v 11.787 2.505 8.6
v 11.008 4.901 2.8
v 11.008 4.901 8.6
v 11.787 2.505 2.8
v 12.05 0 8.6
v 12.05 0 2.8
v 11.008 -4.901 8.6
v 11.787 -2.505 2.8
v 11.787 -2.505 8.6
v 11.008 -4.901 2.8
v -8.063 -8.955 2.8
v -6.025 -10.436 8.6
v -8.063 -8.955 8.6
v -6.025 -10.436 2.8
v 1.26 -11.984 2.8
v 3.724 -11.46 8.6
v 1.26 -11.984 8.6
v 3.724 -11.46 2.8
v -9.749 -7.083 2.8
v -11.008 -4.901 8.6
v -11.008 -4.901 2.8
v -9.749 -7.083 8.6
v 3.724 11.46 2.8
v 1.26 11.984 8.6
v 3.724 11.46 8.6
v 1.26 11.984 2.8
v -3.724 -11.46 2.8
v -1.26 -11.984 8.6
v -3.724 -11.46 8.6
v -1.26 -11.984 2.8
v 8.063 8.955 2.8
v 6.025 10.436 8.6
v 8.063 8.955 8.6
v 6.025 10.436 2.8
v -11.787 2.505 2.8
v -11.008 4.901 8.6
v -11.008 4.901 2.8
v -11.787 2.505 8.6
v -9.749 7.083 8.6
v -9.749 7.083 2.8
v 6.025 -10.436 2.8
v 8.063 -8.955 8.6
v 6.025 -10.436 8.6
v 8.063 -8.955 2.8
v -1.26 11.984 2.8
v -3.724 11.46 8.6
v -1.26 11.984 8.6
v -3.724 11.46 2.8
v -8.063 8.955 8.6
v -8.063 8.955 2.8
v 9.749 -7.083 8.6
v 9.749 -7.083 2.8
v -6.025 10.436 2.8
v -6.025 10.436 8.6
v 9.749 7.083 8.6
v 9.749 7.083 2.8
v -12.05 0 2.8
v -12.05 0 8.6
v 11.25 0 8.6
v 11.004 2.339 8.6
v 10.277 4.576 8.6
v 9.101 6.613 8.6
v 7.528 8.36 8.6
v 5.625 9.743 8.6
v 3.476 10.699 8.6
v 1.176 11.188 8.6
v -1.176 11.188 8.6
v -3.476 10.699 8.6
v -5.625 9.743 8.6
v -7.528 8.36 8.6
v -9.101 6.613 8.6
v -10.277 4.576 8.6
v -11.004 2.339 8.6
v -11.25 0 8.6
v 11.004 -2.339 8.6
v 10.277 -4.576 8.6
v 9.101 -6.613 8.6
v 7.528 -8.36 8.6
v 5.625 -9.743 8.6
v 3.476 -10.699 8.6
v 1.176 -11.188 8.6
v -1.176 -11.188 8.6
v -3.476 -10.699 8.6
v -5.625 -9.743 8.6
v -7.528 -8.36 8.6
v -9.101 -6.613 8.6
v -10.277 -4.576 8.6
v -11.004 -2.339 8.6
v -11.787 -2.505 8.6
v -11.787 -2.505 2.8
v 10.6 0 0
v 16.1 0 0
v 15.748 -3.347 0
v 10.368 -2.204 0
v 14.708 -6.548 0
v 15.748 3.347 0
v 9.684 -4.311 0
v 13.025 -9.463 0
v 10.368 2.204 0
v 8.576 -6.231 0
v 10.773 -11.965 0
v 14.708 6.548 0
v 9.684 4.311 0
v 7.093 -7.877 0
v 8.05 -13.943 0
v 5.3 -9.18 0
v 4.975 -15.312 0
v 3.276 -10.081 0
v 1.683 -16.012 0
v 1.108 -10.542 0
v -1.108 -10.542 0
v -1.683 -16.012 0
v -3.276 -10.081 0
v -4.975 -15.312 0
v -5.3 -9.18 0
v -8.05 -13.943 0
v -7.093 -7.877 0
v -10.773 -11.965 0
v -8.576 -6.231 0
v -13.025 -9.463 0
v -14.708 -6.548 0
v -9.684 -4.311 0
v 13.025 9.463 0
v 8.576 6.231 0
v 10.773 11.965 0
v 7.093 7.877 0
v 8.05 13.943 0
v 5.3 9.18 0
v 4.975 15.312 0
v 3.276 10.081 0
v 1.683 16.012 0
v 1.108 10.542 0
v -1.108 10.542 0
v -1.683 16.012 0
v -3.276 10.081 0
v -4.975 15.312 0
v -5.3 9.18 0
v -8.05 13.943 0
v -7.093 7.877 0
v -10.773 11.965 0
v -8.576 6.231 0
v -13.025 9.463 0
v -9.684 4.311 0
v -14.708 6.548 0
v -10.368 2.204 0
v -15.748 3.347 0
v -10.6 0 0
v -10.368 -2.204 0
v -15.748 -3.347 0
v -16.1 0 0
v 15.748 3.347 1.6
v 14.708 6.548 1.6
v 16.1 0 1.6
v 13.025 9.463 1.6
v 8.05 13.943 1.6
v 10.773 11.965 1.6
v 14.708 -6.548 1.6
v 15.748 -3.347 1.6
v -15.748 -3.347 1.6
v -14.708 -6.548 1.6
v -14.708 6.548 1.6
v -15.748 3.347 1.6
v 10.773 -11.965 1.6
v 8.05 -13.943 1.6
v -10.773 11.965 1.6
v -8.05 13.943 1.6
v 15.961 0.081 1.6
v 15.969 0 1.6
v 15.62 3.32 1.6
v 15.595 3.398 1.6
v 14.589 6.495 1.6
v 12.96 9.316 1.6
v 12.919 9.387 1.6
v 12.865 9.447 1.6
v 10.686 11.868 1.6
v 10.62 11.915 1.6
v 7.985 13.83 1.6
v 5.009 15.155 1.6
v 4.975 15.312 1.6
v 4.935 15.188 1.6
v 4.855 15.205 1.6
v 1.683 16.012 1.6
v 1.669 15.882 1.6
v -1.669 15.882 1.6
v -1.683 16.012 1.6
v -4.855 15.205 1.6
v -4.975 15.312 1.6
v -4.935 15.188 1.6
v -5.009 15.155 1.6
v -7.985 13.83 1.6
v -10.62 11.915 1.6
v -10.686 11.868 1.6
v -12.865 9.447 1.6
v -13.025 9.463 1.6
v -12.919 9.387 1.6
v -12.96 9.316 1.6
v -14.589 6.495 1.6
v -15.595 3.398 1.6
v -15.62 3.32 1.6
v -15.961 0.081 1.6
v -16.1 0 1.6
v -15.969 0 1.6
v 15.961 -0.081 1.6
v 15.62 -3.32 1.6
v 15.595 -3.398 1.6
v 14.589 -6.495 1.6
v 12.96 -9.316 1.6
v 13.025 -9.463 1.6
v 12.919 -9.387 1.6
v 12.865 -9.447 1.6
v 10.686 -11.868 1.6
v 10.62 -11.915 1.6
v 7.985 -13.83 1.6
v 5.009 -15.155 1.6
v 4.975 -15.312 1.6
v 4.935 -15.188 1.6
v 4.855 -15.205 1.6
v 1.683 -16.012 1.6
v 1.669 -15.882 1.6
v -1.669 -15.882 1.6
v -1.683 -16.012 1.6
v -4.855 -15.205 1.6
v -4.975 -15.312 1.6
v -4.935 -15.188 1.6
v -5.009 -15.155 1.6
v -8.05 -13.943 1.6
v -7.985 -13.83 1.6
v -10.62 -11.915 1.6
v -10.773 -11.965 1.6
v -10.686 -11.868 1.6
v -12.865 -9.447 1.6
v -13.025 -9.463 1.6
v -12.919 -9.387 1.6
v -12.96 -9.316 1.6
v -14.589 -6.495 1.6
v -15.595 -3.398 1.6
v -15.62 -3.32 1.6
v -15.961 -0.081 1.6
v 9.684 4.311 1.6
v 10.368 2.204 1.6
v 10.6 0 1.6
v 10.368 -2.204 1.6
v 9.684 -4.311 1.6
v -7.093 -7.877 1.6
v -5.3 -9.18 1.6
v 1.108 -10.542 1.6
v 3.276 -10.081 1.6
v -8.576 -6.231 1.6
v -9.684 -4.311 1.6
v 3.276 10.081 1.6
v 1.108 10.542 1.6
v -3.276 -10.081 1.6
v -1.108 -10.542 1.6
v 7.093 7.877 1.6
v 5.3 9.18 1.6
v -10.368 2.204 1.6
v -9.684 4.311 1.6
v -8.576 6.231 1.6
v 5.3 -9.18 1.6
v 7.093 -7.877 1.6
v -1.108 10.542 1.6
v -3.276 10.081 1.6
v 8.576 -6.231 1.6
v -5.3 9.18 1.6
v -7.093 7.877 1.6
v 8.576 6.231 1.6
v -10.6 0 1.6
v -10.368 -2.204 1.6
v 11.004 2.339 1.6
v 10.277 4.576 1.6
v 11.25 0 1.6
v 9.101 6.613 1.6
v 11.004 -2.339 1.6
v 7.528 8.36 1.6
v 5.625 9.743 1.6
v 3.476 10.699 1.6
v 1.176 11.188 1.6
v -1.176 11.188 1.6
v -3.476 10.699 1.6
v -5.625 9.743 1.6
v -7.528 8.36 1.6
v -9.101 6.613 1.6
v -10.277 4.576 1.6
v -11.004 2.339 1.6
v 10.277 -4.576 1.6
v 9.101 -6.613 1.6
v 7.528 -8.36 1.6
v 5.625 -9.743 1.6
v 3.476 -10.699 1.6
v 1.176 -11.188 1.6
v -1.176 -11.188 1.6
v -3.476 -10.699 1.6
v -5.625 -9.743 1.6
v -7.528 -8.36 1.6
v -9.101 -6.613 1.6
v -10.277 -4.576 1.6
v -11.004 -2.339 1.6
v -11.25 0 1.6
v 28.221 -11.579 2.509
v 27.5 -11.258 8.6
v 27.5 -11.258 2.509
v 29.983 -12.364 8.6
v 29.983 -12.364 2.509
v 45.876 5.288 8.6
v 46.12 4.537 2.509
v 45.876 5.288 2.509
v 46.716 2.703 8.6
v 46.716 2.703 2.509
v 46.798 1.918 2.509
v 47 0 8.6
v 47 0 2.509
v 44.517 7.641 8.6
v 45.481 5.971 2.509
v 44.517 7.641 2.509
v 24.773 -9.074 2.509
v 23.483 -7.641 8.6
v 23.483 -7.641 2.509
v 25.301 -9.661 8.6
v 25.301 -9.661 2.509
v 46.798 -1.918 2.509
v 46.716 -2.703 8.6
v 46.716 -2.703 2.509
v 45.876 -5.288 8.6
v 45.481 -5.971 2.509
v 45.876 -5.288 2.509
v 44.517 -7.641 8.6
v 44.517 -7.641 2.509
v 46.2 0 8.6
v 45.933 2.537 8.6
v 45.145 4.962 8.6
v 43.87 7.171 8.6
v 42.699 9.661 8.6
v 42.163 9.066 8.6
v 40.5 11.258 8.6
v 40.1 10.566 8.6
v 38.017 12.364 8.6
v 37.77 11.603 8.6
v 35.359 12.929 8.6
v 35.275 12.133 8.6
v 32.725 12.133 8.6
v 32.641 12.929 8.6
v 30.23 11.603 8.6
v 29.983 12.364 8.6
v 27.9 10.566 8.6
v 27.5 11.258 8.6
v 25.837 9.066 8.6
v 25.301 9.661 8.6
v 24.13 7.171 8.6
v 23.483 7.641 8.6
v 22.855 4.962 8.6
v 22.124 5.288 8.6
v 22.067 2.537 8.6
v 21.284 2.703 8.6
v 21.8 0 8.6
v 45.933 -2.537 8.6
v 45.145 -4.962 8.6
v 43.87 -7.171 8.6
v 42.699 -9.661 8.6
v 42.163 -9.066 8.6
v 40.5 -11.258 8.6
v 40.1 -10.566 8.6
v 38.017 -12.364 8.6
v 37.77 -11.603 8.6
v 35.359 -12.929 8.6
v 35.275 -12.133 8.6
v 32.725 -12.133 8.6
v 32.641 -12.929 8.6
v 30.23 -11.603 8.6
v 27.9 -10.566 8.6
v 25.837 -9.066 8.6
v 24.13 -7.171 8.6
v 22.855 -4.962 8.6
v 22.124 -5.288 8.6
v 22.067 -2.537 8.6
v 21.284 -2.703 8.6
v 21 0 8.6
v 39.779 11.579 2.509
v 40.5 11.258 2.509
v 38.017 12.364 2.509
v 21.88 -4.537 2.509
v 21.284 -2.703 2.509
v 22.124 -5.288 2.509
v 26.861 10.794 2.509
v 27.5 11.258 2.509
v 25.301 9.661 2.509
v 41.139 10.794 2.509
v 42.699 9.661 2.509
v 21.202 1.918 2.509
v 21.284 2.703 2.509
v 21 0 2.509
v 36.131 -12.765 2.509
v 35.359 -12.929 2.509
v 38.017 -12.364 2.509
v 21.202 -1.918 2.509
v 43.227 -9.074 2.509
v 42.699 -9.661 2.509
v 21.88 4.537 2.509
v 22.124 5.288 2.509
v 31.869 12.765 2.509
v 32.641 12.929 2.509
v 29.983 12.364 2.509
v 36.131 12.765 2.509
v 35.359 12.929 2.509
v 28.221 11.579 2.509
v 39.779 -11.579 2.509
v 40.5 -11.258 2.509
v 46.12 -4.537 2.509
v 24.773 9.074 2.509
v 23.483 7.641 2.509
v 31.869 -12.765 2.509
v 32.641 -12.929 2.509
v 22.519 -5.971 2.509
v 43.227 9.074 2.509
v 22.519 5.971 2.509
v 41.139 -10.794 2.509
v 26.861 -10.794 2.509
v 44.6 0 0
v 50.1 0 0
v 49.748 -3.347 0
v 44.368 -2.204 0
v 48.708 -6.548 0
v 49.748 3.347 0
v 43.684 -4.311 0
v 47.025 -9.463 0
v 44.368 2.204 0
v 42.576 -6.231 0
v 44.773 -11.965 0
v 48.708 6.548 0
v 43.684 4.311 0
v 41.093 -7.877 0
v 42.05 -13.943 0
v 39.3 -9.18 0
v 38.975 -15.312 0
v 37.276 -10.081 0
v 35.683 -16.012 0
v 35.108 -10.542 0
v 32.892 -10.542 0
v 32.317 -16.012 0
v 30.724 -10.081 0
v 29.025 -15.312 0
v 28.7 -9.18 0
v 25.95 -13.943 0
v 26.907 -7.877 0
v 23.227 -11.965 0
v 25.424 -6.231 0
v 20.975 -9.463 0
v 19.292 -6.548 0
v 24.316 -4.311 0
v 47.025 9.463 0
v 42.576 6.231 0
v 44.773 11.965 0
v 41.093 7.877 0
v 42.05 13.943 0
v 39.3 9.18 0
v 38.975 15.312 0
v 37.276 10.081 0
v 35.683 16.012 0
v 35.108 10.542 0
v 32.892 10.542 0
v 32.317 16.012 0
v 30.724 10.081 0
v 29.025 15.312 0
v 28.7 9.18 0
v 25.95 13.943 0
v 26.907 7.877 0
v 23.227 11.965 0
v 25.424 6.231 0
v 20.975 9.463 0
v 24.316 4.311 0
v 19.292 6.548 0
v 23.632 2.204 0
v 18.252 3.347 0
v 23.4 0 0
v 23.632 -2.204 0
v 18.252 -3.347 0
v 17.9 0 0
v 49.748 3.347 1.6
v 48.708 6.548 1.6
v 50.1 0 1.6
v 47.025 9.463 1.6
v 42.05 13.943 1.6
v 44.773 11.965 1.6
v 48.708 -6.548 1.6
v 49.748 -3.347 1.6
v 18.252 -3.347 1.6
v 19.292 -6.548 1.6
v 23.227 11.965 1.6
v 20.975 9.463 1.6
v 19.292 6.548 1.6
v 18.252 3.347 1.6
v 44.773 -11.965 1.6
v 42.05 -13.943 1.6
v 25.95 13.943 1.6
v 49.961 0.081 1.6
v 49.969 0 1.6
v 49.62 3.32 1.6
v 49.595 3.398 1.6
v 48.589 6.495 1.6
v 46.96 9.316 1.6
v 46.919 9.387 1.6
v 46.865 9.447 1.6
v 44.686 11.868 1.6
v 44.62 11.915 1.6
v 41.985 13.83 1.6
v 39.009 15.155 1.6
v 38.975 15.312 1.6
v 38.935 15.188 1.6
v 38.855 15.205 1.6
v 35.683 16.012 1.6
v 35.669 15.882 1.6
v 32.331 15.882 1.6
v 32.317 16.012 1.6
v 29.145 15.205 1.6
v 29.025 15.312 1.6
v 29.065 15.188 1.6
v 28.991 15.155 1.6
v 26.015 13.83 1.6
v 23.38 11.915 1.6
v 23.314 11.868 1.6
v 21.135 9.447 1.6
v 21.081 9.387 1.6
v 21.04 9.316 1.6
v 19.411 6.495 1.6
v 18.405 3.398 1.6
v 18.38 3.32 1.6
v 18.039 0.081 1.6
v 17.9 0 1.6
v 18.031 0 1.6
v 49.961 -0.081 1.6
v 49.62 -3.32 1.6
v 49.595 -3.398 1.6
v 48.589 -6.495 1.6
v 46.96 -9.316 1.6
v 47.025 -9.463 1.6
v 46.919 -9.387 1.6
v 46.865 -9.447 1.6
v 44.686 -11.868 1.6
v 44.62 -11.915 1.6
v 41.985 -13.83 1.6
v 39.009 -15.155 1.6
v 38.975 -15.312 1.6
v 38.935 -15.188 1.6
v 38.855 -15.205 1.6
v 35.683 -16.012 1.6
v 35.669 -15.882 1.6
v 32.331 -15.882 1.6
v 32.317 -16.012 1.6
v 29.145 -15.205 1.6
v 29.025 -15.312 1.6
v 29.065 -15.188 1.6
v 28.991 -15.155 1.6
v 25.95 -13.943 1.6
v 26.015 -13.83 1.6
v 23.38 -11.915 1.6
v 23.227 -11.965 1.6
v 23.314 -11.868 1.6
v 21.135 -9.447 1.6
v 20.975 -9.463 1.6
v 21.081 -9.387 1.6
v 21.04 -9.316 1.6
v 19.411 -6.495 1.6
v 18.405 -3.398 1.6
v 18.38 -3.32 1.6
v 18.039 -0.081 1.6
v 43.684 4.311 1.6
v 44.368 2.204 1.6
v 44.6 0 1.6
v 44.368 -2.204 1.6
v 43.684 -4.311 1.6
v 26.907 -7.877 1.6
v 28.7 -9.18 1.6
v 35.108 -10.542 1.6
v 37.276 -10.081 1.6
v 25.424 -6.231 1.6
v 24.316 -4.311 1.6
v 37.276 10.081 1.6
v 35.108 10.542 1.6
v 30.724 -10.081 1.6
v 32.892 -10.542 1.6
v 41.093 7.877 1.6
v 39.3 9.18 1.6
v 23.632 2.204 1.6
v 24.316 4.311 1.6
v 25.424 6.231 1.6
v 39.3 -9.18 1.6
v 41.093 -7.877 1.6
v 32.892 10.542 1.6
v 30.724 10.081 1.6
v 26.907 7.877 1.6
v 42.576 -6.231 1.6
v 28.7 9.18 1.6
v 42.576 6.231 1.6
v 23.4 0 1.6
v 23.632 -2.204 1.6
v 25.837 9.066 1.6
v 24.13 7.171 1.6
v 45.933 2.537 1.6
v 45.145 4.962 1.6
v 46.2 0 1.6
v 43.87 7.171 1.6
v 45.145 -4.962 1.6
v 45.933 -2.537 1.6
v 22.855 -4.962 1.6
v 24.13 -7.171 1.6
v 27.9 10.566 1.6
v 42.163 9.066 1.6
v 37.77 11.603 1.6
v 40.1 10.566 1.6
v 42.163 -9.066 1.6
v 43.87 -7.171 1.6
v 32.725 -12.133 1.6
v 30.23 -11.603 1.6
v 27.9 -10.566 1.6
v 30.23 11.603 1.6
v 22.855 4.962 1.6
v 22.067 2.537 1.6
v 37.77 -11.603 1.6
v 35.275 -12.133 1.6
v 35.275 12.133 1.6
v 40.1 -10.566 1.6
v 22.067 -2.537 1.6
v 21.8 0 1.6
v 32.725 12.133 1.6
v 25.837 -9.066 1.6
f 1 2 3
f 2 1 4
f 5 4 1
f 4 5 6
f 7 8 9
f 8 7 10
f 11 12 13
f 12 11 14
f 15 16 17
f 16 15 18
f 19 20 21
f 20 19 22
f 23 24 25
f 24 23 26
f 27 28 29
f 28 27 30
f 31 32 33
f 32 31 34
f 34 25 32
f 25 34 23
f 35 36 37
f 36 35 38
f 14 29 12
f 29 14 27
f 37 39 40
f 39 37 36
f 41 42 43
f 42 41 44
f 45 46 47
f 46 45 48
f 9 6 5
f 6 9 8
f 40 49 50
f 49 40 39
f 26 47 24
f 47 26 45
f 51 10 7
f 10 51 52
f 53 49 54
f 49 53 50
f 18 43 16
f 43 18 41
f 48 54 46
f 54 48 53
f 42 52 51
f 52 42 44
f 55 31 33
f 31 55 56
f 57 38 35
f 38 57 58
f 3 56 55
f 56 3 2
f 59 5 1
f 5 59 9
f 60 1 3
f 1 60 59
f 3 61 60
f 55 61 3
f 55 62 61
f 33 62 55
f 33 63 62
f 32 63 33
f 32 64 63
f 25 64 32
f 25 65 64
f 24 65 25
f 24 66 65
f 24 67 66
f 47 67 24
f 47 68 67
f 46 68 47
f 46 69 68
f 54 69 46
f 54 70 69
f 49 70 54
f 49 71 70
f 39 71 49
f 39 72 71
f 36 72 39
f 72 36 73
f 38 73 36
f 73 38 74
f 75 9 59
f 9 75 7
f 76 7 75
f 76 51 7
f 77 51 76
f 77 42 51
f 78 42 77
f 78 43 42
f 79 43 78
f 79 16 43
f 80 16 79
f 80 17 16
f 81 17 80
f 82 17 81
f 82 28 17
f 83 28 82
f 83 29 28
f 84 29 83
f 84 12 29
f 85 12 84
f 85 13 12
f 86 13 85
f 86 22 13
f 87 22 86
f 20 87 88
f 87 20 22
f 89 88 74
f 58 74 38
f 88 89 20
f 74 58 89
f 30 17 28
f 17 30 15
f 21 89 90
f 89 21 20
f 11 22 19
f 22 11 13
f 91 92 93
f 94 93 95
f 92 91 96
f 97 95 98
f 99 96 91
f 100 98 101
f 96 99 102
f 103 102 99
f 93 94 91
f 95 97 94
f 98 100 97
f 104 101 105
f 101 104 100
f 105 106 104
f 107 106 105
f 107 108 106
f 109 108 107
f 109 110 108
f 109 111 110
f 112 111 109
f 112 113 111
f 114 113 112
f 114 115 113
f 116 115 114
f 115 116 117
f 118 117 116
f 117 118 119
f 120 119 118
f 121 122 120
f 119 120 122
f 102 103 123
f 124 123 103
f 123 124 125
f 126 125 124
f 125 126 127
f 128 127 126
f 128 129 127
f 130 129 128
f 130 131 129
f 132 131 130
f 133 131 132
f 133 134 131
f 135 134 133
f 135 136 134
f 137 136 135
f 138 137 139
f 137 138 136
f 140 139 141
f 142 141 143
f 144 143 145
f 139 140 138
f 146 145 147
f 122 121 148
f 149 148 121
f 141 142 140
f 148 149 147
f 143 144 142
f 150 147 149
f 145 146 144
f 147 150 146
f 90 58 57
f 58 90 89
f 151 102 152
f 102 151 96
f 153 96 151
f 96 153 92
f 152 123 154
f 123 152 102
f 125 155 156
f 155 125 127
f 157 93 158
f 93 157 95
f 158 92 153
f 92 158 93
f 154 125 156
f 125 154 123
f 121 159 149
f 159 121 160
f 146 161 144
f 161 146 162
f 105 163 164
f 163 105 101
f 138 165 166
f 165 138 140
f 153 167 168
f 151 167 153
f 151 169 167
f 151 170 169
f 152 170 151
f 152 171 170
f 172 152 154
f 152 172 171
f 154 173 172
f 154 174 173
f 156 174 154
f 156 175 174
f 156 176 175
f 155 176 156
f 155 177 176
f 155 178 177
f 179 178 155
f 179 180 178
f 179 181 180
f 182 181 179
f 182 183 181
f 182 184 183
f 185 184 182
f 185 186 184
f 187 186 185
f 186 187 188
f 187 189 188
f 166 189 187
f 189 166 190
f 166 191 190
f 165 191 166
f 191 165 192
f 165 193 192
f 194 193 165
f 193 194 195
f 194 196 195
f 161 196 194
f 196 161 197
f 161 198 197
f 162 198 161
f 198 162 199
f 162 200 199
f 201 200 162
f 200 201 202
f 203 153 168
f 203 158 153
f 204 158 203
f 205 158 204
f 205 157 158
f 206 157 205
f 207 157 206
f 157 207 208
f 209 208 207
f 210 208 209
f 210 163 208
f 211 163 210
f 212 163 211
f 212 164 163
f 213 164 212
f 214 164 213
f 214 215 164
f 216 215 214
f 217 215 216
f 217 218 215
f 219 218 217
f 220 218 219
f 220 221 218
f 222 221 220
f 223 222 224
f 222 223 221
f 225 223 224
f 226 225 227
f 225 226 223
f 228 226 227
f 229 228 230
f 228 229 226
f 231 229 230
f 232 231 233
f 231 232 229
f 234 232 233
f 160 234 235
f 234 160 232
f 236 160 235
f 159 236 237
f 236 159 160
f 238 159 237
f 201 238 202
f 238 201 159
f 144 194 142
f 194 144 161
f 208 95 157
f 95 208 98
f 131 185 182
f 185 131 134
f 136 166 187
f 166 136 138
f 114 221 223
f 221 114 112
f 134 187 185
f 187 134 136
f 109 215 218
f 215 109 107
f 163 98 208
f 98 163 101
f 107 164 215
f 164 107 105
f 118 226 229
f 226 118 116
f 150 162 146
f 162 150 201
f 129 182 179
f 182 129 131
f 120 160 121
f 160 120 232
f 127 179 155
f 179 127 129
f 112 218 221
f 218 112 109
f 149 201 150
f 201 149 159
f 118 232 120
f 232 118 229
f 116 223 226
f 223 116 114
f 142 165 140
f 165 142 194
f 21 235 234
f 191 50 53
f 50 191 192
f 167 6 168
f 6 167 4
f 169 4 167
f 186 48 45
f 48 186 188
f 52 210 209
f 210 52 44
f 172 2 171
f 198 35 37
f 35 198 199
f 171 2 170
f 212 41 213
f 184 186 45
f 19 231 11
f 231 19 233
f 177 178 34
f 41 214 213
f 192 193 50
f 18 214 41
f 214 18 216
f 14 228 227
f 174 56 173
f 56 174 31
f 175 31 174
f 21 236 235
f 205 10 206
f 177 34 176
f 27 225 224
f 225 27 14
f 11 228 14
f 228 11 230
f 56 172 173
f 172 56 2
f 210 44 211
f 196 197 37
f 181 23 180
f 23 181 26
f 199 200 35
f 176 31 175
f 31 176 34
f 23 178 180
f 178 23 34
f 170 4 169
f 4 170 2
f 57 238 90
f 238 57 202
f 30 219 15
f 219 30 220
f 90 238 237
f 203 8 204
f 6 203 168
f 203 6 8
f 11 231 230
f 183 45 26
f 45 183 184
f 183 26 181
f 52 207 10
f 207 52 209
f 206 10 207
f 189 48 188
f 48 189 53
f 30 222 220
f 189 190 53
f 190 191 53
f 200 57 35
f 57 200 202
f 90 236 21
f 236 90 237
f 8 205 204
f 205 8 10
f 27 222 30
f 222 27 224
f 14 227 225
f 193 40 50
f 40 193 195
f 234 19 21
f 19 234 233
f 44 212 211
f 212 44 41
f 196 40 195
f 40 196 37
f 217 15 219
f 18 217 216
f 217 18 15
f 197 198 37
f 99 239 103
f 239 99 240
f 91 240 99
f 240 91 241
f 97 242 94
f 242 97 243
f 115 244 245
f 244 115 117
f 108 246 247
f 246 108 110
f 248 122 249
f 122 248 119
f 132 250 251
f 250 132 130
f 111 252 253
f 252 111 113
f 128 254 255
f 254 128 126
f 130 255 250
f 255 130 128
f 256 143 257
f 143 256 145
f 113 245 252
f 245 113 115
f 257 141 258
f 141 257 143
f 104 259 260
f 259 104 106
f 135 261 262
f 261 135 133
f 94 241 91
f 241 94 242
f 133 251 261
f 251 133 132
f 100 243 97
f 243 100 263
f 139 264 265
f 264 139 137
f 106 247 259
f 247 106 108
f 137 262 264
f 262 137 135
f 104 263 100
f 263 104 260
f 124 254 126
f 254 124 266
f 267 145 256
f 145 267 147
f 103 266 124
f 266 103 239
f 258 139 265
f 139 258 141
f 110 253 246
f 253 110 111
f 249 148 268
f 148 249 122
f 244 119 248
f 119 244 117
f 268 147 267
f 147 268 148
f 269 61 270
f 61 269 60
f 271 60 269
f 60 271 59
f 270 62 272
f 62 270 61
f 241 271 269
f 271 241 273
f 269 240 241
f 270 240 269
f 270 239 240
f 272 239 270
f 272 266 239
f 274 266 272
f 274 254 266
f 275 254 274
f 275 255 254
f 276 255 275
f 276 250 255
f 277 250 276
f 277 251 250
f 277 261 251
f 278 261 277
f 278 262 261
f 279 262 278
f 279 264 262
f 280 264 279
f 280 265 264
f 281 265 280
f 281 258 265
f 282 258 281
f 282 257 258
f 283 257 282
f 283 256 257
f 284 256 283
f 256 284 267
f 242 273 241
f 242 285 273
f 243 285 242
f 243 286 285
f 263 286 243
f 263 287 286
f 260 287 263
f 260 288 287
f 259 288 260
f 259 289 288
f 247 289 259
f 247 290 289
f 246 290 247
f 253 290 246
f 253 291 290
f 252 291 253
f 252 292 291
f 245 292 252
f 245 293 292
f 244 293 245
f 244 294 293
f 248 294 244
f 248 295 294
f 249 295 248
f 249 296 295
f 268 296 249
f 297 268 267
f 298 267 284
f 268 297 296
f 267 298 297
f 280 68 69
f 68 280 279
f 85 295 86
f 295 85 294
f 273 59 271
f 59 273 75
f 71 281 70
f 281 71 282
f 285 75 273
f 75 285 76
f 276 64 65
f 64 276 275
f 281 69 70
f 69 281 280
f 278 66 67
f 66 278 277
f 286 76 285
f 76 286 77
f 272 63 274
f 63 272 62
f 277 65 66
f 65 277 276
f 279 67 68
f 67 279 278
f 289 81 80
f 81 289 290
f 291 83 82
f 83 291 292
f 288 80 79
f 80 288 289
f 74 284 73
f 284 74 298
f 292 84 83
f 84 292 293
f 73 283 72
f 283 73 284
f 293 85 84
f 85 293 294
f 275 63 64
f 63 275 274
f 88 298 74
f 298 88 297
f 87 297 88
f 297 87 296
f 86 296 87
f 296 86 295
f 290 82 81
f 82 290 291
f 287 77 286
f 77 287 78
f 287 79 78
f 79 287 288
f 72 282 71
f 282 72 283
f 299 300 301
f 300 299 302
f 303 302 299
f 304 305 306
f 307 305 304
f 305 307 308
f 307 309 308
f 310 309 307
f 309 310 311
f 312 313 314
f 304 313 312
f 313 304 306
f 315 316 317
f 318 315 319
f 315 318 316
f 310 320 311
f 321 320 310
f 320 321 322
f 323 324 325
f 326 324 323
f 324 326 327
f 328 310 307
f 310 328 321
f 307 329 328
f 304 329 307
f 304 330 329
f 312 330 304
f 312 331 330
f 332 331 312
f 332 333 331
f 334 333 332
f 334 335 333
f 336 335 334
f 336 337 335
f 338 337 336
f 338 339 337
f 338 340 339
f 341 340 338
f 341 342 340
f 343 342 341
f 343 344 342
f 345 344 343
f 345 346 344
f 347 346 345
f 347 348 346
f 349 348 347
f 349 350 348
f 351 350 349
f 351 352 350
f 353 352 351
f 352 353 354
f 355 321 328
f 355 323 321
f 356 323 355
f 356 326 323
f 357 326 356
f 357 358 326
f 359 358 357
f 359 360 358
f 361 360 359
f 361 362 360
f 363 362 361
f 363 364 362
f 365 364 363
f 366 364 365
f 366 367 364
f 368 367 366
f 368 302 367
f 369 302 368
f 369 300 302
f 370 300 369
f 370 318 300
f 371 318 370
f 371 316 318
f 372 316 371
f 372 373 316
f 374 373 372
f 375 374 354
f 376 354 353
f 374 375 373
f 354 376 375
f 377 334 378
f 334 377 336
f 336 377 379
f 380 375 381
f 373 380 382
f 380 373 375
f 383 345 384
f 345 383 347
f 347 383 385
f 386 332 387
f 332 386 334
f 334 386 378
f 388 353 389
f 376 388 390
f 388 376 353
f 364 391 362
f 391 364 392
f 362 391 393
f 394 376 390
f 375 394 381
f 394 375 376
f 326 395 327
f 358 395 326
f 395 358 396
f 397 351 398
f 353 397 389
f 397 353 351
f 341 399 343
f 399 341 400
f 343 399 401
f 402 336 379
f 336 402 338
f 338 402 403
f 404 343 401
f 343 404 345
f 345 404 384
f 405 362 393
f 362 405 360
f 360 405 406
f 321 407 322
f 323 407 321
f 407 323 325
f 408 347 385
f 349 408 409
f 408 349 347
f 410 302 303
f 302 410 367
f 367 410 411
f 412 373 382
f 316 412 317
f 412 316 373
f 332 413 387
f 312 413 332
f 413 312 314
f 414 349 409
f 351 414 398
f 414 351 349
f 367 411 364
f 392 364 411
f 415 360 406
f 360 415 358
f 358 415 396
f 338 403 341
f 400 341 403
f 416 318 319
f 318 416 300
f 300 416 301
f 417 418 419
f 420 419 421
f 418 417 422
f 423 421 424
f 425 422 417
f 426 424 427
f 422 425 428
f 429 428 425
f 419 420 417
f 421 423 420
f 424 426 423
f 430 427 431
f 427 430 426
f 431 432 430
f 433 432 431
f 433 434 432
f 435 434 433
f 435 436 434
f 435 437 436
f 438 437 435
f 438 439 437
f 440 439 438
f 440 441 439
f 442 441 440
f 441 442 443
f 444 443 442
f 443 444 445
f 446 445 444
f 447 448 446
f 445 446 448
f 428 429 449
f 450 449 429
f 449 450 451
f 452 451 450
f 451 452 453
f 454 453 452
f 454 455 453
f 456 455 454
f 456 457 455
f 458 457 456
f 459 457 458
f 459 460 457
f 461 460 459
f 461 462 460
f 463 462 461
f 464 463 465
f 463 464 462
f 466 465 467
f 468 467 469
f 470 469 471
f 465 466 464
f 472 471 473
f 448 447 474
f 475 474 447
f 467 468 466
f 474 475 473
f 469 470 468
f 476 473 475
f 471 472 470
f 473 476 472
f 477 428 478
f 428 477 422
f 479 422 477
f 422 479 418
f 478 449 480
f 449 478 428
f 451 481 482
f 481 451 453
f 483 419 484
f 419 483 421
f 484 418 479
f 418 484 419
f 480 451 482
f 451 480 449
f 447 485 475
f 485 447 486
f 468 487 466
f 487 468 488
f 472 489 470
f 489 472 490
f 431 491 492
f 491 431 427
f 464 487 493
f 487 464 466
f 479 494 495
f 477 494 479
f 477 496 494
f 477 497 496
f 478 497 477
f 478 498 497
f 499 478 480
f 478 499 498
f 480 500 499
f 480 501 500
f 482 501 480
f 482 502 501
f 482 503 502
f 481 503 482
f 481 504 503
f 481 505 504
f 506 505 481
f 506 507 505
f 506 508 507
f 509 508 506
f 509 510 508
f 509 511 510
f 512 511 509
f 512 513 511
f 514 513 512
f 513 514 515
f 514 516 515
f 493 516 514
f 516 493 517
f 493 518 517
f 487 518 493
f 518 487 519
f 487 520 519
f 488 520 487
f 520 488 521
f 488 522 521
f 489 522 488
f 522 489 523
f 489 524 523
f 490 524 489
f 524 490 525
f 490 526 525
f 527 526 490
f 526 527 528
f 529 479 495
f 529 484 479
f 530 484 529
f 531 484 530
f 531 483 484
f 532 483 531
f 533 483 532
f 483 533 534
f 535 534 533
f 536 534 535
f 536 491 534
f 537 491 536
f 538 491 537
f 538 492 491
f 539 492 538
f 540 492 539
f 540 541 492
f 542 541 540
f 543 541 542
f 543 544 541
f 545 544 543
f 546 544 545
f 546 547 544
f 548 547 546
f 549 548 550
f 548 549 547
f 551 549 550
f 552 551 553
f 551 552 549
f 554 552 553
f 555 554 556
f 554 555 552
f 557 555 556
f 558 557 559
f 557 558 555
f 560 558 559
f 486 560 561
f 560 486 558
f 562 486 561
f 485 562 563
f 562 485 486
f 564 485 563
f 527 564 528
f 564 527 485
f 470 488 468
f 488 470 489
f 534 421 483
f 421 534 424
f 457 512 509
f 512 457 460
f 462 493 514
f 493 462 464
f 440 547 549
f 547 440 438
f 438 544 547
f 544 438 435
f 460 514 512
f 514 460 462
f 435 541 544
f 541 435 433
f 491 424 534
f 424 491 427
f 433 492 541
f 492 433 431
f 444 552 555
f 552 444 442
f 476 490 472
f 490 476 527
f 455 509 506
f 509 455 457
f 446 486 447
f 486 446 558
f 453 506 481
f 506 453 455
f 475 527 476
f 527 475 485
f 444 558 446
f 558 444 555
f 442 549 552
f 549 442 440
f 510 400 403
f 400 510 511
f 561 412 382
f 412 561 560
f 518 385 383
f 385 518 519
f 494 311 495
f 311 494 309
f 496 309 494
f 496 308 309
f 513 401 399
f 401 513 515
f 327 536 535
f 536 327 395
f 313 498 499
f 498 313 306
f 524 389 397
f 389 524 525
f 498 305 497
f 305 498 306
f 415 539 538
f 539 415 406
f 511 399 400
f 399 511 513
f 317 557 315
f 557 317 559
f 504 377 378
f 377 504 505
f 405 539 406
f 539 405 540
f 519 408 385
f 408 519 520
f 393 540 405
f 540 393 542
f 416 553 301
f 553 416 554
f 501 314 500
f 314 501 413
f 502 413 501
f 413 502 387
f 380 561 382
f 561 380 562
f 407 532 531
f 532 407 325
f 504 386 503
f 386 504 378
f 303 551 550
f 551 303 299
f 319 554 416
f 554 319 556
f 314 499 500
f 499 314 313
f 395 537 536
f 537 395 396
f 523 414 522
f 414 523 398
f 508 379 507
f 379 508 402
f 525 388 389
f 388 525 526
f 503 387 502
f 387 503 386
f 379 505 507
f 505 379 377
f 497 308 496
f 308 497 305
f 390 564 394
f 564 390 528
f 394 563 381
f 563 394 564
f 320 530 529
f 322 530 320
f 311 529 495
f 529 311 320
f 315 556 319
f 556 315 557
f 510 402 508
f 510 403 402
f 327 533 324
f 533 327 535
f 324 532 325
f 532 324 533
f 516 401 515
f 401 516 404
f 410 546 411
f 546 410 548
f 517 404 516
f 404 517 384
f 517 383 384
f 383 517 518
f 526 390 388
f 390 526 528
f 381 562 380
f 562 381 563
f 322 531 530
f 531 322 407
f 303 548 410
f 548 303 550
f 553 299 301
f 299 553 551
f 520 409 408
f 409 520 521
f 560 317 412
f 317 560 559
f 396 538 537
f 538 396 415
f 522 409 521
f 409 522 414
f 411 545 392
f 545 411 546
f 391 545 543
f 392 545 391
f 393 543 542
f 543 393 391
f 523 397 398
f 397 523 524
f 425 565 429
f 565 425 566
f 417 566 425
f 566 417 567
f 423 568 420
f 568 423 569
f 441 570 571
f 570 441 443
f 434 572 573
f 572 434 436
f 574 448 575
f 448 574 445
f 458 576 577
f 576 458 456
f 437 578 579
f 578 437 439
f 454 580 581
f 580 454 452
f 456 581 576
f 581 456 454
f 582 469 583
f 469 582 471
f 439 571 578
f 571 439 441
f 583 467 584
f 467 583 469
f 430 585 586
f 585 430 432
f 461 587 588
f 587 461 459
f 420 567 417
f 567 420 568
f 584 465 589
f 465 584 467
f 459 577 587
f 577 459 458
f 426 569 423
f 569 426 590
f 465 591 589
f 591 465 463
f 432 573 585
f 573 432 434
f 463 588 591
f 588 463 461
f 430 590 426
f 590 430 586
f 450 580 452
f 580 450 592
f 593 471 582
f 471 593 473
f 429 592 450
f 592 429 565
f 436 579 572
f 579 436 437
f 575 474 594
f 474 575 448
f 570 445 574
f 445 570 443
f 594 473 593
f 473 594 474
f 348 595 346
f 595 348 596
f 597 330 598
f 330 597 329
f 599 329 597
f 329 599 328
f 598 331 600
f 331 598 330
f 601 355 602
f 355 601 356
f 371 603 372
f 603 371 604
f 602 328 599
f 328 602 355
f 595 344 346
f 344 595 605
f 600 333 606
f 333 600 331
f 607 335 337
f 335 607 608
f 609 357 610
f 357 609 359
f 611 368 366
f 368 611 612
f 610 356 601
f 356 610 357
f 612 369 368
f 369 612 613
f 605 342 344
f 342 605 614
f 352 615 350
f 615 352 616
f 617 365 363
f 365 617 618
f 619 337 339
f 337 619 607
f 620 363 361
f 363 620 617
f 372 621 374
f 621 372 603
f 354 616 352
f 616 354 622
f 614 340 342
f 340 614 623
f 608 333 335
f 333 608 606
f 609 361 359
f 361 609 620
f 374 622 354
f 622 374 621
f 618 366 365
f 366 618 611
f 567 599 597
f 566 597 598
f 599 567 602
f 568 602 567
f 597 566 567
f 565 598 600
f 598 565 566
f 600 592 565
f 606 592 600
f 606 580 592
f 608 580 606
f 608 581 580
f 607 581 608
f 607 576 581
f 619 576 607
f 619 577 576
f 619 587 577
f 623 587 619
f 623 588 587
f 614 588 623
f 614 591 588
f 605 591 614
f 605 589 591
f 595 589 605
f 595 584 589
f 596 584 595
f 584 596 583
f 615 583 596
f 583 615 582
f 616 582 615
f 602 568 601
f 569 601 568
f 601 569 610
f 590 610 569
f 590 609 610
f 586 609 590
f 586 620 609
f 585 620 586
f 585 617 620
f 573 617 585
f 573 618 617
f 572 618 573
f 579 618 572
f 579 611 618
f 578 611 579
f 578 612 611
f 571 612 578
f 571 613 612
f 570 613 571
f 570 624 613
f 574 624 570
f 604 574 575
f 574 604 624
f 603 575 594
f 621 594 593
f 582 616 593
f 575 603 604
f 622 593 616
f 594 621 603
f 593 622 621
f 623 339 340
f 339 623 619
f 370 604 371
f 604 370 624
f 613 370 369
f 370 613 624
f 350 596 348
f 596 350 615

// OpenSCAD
//PRUSAMendel
//GNUGPLv2
//GregFrost

/**
*@categoryPrinted
*/

layer_height=0.4;
perimeter_w_over_t=2;

single_layer_width=layer_height*perimeter_w_over_t;
bearing_inner=22.2;

edge_thickness=layer_height*4;
slope_thickness=layer_height*3.1;
height=7+edge_thickness;
wall_ascent=5;
wall_descent=0.5;
tolerance=0.15;

module bearing_guide(inner_r=2)
{
	difference()
	{
		union()
		{
			cylinder(r=inner_r++single_layer_width,h=height);

			cylinder(r=bearing_inner/2+wall_ascent,h=edge_thickness);
			translate([0,0,edge_thickness-layer_height*0.1])
			cylinder(r1=bearing_inner/2+wall_ascent,
				r2=bearing_inner/2+single_layer_width+tolerance,
				h=slope_thickness);
		}
		translate([0,0,-1])
		cylinder(r=bearing_inner/2-wall_descent,h=edge_thickness+2);

		translate([0,0,edge_thickness])
		cylinder(r=inner_r,h=height);
	}
}

module inner()
{
	bearing_guide(inner_r=bearing_inner/2+tolerance);
}

module outer()
{
	bearing_guide(inner_r=bearing_inner/2+single_layer_width+2*+tolerance);
}

inner();

translate([34,0,0])
outer();
